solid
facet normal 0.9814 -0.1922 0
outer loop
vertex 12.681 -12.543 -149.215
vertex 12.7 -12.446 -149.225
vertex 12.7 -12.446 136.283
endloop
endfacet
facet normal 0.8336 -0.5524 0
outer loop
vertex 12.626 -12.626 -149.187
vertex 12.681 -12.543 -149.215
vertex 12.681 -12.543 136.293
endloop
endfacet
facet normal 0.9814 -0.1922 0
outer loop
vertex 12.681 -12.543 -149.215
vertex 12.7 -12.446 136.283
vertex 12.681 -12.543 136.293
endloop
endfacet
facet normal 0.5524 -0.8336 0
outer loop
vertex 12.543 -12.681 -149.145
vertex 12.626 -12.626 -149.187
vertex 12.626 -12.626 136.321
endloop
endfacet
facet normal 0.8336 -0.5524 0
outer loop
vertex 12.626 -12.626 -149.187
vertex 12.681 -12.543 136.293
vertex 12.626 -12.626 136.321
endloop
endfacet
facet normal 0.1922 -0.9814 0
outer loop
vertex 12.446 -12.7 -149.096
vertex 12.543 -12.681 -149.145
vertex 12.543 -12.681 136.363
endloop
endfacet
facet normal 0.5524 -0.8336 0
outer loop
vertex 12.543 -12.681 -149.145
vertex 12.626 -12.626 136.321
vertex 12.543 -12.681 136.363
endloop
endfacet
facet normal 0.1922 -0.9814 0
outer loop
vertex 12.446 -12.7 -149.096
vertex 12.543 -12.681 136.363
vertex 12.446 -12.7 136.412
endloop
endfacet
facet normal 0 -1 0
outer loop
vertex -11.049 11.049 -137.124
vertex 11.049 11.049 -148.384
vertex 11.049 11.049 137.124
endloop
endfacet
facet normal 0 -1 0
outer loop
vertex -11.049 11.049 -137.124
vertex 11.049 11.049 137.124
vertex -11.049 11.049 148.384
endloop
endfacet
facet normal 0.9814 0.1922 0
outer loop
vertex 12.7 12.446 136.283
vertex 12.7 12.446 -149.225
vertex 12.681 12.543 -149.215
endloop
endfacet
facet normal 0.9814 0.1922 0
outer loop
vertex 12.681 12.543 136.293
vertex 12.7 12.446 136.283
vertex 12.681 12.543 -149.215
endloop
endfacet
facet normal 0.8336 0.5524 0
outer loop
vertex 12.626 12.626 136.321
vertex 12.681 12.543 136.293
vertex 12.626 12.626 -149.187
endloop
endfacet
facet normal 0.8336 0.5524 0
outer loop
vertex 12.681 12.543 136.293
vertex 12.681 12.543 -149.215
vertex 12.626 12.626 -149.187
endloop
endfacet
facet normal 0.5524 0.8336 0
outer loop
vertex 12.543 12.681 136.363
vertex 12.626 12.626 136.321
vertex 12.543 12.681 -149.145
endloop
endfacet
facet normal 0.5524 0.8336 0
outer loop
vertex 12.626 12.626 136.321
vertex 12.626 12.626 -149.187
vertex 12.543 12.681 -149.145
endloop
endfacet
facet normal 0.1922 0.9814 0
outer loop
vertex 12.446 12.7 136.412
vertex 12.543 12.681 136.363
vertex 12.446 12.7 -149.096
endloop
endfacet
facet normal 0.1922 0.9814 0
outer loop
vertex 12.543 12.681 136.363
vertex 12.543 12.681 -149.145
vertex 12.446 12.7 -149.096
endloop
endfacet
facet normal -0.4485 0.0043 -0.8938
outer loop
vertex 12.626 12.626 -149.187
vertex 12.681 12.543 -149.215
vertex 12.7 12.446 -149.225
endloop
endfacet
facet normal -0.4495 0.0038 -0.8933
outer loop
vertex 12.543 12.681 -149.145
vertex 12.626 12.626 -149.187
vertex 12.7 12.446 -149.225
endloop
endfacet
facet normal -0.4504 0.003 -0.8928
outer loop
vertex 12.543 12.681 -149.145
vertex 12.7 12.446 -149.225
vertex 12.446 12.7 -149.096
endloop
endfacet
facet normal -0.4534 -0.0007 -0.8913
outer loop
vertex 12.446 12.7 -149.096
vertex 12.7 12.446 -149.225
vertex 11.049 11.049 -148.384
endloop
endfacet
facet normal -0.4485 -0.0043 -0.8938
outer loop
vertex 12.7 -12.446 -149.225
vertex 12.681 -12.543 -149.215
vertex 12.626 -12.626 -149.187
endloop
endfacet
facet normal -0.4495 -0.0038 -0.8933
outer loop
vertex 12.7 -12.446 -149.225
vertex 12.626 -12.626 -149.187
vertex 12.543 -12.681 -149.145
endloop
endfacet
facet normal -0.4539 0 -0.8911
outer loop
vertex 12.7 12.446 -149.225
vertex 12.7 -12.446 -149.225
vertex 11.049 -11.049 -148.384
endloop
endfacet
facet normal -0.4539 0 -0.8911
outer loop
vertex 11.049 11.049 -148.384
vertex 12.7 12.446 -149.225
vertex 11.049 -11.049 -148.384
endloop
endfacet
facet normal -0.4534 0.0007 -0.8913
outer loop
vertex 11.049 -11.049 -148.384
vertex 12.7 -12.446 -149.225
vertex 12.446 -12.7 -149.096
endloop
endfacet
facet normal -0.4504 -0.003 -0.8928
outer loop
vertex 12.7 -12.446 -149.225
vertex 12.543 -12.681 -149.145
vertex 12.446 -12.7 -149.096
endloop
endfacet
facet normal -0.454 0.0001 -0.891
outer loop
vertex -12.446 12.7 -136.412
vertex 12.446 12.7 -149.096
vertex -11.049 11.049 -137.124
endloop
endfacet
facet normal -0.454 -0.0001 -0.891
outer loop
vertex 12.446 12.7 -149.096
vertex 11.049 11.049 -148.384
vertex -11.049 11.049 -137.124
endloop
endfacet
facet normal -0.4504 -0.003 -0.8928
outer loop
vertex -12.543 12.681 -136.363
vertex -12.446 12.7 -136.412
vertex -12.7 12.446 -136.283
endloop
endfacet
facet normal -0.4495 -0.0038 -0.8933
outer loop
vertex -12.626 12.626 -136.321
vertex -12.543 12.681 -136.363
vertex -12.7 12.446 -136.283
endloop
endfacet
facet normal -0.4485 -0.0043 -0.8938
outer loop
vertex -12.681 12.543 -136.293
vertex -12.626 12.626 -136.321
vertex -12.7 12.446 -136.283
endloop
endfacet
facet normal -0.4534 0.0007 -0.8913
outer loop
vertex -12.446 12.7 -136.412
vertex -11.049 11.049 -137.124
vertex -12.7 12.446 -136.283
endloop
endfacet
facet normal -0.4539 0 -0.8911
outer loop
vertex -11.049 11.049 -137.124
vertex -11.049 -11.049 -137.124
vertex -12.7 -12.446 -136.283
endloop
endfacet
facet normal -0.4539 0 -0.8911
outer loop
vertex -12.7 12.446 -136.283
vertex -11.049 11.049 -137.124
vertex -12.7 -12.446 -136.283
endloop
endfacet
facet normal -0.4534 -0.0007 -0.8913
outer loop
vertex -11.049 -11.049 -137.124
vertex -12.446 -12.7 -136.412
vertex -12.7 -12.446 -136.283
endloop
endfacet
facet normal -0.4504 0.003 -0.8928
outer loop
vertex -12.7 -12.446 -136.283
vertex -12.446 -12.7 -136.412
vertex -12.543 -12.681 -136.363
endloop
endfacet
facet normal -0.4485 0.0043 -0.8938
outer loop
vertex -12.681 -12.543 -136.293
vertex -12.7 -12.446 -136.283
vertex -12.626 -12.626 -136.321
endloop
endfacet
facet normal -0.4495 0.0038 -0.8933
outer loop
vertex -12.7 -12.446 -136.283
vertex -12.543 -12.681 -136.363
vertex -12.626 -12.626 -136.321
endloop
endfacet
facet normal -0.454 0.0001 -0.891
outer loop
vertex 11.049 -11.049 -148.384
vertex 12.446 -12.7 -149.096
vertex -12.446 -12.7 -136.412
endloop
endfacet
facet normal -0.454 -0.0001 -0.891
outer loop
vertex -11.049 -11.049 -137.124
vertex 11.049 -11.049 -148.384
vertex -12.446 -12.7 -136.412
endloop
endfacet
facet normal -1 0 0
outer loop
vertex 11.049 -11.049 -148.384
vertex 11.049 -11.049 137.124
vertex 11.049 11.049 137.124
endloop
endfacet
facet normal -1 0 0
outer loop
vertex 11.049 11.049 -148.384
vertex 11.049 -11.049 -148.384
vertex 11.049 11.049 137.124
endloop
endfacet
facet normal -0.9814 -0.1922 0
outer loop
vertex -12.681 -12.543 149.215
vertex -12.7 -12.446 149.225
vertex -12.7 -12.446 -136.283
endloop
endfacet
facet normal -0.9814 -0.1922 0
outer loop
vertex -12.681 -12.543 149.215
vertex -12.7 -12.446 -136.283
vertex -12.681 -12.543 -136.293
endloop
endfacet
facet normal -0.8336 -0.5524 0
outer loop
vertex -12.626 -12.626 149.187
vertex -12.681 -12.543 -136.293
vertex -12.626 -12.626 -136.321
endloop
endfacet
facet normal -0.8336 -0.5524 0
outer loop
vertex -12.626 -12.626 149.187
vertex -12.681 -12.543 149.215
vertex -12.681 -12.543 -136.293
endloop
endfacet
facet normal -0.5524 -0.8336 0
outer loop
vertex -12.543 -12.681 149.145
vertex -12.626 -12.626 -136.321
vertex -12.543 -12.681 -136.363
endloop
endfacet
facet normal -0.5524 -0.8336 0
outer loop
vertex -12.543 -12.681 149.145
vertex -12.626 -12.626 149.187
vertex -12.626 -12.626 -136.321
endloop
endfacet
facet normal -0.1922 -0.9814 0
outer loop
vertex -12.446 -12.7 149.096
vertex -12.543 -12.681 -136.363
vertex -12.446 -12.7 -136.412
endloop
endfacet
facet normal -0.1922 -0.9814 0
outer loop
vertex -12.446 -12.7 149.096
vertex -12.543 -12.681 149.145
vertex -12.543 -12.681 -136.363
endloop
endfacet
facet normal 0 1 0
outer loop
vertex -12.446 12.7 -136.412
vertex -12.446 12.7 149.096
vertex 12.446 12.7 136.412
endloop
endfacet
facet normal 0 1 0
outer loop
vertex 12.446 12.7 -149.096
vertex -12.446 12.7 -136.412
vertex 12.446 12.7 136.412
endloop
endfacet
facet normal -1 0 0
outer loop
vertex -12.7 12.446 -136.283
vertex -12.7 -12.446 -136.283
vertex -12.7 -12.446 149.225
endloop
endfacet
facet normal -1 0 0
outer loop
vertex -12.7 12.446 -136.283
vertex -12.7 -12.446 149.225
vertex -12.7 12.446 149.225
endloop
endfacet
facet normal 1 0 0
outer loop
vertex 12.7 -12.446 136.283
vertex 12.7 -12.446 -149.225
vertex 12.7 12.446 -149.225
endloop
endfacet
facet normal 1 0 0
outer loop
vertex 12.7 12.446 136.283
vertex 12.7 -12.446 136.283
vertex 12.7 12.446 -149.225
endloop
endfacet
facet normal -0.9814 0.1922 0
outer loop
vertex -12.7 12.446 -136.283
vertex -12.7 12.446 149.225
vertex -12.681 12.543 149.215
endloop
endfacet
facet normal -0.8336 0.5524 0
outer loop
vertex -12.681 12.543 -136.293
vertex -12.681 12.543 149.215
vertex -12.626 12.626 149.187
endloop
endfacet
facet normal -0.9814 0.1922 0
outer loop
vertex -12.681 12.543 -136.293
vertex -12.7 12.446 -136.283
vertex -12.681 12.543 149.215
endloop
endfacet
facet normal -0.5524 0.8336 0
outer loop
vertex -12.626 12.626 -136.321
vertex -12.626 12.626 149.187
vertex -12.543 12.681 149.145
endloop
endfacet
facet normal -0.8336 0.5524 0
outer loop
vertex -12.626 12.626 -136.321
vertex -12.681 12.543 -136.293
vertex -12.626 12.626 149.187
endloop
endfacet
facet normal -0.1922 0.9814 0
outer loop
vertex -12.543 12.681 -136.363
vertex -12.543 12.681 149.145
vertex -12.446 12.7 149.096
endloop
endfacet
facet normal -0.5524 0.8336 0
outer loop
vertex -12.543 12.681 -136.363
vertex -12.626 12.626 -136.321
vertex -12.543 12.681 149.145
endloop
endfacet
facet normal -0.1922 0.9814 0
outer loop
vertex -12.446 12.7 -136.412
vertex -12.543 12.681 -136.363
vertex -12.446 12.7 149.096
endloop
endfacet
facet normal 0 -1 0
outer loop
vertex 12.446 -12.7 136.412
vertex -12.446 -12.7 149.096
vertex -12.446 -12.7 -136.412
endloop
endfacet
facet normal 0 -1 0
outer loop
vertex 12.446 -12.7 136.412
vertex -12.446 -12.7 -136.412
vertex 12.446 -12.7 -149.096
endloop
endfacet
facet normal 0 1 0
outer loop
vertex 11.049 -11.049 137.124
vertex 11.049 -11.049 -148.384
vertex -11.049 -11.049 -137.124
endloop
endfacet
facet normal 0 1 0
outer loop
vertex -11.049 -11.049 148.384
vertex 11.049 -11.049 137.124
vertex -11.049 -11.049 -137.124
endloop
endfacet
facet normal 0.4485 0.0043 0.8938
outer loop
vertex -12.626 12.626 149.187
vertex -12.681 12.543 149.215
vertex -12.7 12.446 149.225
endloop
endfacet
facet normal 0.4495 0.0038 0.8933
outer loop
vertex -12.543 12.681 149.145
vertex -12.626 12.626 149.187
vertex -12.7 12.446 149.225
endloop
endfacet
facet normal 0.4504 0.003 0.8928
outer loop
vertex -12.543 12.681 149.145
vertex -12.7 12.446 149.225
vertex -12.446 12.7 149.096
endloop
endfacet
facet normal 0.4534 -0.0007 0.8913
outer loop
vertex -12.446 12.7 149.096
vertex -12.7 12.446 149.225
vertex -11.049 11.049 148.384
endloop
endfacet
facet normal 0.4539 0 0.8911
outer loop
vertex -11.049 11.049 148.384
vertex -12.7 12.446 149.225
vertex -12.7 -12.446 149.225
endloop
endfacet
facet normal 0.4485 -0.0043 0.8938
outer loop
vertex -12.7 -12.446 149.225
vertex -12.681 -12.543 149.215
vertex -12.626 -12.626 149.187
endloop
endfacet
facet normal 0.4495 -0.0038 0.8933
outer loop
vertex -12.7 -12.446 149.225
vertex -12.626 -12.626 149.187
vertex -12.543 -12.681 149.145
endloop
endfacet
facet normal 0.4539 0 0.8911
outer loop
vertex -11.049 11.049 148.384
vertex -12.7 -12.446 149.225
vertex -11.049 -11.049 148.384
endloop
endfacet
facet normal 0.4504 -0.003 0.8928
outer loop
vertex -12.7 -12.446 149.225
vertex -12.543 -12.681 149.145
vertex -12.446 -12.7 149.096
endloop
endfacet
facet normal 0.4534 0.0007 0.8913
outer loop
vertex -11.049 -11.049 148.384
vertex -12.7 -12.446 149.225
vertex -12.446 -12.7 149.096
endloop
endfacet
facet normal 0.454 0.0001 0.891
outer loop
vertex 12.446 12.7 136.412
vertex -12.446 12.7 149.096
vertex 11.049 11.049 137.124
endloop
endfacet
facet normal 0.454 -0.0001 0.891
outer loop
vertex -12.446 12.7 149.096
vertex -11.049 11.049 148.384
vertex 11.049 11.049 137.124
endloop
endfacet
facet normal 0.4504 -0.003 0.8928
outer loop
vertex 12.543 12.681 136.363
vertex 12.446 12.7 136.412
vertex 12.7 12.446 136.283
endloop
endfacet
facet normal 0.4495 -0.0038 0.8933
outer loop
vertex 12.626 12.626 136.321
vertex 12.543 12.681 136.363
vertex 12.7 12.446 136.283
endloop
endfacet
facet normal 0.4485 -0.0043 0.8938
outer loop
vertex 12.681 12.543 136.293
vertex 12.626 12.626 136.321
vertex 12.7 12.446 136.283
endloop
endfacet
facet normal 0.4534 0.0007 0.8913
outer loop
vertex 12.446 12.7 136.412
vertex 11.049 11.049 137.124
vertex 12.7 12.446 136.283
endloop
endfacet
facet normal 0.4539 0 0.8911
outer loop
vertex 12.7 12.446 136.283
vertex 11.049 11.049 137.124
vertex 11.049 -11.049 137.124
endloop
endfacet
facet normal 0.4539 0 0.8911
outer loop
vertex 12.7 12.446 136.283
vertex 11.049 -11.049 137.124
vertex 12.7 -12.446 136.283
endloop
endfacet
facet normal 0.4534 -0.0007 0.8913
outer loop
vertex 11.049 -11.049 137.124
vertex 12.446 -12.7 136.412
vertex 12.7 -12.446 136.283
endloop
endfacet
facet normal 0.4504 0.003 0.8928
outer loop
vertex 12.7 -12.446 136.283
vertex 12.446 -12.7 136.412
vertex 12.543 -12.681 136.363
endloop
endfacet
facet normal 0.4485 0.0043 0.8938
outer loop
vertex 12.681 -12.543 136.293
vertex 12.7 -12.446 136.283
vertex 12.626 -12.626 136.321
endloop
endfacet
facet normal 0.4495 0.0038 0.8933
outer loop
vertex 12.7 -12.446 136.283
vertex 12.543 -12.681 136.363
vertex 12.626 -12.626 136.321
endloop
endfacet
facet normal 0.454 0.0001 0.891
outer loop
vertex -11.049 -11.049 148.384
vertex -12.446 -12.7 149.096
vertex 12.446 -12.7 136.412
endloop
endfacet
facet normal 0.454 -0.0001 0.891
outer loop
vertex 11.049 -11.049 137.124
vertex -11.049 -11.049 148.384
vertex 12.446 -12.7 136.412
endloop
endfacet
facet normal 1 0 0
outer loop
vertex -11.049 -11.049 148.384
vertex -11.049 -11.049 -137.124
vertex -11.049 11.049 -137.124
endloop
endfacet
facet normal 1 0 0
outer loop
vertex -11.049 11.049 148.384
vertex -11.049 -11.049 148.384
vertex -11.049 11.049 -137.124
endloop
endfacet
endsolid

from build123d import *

# Parameters (mm, degrees)
SKETCH1_W           = 25.4
SKETCH1_H           = 25.4
BOSS_EXTRUDE1_DEPTH = 149.225
FILLET1_R           = 0.254
CUT_EXTRUDE1_DEPTH  = 38.1
SKETCH4_W           = 22.098
SKETCH4_H           = 22.098
CUT_EXTRUDE4_DEPTH  = 685.8
CUT_EXTRUDE5_DEPTH  = 685.8


with BuildPart() as part:
    # Sketch1 → Boss-Extrude1 (new, symmetric)
    with BuildSketch(Plane.XY):
        Rectangle(SKETCH1_W, SKETCH1_H)
    extrude(amount=BOSS_EXTRUDE1_DEPTH, both=True)

    # Fillet1
    fillet1_edges = [part.edges().sort_by_distance(p)[0] for p in [
        (-12.7, 12.7, 0),
        (-12.7, -12.7, 0),
        (12.7, -12.7, 0),
        (12.7, 12.7, 0),
    ]]
    fillet(fillet1_edges, radius=FILLET1_R)

    # Sketch2 → Cut-Extrude1 (cut)
    with BuildSketch(Plane.XZ.offset(12.7)):
        Polygon((-12.7, 149.225), (12.7, 136.283053583), (12.7, 149.225), align=None)
    extrude(amount=-CUT_EXTRUDE1_DEPTH, mode=Mode.SUBTRACT)

    # Sketch4 → Cut-Extrude4 (cut)
    with BuildSketch(Plane(origin=(0, 0, -149.225), x_dir=(-1, 0, 0), z_dir=(0, 0, -1))):
        Rectangle(SKETCH4_W, SKETCH4_H)
    extrude(amount=-CUT_EXTRUDE4_DEPTH, mode=Mode.SUBTRACT)

    # Sketch5 → Cut-Extrude5 (cut)
    with BuildSketch(Plane.XZ.offset(12.7)):
        Polygon((-12.7, -136.283053583), (-12.7, -149.225), (12.7, -149.225), align=None)
    extrude(amount=-CUT_EXTRUDE5_DEPTH, mode=Mode.SUBTRACT)


solid = part.part
